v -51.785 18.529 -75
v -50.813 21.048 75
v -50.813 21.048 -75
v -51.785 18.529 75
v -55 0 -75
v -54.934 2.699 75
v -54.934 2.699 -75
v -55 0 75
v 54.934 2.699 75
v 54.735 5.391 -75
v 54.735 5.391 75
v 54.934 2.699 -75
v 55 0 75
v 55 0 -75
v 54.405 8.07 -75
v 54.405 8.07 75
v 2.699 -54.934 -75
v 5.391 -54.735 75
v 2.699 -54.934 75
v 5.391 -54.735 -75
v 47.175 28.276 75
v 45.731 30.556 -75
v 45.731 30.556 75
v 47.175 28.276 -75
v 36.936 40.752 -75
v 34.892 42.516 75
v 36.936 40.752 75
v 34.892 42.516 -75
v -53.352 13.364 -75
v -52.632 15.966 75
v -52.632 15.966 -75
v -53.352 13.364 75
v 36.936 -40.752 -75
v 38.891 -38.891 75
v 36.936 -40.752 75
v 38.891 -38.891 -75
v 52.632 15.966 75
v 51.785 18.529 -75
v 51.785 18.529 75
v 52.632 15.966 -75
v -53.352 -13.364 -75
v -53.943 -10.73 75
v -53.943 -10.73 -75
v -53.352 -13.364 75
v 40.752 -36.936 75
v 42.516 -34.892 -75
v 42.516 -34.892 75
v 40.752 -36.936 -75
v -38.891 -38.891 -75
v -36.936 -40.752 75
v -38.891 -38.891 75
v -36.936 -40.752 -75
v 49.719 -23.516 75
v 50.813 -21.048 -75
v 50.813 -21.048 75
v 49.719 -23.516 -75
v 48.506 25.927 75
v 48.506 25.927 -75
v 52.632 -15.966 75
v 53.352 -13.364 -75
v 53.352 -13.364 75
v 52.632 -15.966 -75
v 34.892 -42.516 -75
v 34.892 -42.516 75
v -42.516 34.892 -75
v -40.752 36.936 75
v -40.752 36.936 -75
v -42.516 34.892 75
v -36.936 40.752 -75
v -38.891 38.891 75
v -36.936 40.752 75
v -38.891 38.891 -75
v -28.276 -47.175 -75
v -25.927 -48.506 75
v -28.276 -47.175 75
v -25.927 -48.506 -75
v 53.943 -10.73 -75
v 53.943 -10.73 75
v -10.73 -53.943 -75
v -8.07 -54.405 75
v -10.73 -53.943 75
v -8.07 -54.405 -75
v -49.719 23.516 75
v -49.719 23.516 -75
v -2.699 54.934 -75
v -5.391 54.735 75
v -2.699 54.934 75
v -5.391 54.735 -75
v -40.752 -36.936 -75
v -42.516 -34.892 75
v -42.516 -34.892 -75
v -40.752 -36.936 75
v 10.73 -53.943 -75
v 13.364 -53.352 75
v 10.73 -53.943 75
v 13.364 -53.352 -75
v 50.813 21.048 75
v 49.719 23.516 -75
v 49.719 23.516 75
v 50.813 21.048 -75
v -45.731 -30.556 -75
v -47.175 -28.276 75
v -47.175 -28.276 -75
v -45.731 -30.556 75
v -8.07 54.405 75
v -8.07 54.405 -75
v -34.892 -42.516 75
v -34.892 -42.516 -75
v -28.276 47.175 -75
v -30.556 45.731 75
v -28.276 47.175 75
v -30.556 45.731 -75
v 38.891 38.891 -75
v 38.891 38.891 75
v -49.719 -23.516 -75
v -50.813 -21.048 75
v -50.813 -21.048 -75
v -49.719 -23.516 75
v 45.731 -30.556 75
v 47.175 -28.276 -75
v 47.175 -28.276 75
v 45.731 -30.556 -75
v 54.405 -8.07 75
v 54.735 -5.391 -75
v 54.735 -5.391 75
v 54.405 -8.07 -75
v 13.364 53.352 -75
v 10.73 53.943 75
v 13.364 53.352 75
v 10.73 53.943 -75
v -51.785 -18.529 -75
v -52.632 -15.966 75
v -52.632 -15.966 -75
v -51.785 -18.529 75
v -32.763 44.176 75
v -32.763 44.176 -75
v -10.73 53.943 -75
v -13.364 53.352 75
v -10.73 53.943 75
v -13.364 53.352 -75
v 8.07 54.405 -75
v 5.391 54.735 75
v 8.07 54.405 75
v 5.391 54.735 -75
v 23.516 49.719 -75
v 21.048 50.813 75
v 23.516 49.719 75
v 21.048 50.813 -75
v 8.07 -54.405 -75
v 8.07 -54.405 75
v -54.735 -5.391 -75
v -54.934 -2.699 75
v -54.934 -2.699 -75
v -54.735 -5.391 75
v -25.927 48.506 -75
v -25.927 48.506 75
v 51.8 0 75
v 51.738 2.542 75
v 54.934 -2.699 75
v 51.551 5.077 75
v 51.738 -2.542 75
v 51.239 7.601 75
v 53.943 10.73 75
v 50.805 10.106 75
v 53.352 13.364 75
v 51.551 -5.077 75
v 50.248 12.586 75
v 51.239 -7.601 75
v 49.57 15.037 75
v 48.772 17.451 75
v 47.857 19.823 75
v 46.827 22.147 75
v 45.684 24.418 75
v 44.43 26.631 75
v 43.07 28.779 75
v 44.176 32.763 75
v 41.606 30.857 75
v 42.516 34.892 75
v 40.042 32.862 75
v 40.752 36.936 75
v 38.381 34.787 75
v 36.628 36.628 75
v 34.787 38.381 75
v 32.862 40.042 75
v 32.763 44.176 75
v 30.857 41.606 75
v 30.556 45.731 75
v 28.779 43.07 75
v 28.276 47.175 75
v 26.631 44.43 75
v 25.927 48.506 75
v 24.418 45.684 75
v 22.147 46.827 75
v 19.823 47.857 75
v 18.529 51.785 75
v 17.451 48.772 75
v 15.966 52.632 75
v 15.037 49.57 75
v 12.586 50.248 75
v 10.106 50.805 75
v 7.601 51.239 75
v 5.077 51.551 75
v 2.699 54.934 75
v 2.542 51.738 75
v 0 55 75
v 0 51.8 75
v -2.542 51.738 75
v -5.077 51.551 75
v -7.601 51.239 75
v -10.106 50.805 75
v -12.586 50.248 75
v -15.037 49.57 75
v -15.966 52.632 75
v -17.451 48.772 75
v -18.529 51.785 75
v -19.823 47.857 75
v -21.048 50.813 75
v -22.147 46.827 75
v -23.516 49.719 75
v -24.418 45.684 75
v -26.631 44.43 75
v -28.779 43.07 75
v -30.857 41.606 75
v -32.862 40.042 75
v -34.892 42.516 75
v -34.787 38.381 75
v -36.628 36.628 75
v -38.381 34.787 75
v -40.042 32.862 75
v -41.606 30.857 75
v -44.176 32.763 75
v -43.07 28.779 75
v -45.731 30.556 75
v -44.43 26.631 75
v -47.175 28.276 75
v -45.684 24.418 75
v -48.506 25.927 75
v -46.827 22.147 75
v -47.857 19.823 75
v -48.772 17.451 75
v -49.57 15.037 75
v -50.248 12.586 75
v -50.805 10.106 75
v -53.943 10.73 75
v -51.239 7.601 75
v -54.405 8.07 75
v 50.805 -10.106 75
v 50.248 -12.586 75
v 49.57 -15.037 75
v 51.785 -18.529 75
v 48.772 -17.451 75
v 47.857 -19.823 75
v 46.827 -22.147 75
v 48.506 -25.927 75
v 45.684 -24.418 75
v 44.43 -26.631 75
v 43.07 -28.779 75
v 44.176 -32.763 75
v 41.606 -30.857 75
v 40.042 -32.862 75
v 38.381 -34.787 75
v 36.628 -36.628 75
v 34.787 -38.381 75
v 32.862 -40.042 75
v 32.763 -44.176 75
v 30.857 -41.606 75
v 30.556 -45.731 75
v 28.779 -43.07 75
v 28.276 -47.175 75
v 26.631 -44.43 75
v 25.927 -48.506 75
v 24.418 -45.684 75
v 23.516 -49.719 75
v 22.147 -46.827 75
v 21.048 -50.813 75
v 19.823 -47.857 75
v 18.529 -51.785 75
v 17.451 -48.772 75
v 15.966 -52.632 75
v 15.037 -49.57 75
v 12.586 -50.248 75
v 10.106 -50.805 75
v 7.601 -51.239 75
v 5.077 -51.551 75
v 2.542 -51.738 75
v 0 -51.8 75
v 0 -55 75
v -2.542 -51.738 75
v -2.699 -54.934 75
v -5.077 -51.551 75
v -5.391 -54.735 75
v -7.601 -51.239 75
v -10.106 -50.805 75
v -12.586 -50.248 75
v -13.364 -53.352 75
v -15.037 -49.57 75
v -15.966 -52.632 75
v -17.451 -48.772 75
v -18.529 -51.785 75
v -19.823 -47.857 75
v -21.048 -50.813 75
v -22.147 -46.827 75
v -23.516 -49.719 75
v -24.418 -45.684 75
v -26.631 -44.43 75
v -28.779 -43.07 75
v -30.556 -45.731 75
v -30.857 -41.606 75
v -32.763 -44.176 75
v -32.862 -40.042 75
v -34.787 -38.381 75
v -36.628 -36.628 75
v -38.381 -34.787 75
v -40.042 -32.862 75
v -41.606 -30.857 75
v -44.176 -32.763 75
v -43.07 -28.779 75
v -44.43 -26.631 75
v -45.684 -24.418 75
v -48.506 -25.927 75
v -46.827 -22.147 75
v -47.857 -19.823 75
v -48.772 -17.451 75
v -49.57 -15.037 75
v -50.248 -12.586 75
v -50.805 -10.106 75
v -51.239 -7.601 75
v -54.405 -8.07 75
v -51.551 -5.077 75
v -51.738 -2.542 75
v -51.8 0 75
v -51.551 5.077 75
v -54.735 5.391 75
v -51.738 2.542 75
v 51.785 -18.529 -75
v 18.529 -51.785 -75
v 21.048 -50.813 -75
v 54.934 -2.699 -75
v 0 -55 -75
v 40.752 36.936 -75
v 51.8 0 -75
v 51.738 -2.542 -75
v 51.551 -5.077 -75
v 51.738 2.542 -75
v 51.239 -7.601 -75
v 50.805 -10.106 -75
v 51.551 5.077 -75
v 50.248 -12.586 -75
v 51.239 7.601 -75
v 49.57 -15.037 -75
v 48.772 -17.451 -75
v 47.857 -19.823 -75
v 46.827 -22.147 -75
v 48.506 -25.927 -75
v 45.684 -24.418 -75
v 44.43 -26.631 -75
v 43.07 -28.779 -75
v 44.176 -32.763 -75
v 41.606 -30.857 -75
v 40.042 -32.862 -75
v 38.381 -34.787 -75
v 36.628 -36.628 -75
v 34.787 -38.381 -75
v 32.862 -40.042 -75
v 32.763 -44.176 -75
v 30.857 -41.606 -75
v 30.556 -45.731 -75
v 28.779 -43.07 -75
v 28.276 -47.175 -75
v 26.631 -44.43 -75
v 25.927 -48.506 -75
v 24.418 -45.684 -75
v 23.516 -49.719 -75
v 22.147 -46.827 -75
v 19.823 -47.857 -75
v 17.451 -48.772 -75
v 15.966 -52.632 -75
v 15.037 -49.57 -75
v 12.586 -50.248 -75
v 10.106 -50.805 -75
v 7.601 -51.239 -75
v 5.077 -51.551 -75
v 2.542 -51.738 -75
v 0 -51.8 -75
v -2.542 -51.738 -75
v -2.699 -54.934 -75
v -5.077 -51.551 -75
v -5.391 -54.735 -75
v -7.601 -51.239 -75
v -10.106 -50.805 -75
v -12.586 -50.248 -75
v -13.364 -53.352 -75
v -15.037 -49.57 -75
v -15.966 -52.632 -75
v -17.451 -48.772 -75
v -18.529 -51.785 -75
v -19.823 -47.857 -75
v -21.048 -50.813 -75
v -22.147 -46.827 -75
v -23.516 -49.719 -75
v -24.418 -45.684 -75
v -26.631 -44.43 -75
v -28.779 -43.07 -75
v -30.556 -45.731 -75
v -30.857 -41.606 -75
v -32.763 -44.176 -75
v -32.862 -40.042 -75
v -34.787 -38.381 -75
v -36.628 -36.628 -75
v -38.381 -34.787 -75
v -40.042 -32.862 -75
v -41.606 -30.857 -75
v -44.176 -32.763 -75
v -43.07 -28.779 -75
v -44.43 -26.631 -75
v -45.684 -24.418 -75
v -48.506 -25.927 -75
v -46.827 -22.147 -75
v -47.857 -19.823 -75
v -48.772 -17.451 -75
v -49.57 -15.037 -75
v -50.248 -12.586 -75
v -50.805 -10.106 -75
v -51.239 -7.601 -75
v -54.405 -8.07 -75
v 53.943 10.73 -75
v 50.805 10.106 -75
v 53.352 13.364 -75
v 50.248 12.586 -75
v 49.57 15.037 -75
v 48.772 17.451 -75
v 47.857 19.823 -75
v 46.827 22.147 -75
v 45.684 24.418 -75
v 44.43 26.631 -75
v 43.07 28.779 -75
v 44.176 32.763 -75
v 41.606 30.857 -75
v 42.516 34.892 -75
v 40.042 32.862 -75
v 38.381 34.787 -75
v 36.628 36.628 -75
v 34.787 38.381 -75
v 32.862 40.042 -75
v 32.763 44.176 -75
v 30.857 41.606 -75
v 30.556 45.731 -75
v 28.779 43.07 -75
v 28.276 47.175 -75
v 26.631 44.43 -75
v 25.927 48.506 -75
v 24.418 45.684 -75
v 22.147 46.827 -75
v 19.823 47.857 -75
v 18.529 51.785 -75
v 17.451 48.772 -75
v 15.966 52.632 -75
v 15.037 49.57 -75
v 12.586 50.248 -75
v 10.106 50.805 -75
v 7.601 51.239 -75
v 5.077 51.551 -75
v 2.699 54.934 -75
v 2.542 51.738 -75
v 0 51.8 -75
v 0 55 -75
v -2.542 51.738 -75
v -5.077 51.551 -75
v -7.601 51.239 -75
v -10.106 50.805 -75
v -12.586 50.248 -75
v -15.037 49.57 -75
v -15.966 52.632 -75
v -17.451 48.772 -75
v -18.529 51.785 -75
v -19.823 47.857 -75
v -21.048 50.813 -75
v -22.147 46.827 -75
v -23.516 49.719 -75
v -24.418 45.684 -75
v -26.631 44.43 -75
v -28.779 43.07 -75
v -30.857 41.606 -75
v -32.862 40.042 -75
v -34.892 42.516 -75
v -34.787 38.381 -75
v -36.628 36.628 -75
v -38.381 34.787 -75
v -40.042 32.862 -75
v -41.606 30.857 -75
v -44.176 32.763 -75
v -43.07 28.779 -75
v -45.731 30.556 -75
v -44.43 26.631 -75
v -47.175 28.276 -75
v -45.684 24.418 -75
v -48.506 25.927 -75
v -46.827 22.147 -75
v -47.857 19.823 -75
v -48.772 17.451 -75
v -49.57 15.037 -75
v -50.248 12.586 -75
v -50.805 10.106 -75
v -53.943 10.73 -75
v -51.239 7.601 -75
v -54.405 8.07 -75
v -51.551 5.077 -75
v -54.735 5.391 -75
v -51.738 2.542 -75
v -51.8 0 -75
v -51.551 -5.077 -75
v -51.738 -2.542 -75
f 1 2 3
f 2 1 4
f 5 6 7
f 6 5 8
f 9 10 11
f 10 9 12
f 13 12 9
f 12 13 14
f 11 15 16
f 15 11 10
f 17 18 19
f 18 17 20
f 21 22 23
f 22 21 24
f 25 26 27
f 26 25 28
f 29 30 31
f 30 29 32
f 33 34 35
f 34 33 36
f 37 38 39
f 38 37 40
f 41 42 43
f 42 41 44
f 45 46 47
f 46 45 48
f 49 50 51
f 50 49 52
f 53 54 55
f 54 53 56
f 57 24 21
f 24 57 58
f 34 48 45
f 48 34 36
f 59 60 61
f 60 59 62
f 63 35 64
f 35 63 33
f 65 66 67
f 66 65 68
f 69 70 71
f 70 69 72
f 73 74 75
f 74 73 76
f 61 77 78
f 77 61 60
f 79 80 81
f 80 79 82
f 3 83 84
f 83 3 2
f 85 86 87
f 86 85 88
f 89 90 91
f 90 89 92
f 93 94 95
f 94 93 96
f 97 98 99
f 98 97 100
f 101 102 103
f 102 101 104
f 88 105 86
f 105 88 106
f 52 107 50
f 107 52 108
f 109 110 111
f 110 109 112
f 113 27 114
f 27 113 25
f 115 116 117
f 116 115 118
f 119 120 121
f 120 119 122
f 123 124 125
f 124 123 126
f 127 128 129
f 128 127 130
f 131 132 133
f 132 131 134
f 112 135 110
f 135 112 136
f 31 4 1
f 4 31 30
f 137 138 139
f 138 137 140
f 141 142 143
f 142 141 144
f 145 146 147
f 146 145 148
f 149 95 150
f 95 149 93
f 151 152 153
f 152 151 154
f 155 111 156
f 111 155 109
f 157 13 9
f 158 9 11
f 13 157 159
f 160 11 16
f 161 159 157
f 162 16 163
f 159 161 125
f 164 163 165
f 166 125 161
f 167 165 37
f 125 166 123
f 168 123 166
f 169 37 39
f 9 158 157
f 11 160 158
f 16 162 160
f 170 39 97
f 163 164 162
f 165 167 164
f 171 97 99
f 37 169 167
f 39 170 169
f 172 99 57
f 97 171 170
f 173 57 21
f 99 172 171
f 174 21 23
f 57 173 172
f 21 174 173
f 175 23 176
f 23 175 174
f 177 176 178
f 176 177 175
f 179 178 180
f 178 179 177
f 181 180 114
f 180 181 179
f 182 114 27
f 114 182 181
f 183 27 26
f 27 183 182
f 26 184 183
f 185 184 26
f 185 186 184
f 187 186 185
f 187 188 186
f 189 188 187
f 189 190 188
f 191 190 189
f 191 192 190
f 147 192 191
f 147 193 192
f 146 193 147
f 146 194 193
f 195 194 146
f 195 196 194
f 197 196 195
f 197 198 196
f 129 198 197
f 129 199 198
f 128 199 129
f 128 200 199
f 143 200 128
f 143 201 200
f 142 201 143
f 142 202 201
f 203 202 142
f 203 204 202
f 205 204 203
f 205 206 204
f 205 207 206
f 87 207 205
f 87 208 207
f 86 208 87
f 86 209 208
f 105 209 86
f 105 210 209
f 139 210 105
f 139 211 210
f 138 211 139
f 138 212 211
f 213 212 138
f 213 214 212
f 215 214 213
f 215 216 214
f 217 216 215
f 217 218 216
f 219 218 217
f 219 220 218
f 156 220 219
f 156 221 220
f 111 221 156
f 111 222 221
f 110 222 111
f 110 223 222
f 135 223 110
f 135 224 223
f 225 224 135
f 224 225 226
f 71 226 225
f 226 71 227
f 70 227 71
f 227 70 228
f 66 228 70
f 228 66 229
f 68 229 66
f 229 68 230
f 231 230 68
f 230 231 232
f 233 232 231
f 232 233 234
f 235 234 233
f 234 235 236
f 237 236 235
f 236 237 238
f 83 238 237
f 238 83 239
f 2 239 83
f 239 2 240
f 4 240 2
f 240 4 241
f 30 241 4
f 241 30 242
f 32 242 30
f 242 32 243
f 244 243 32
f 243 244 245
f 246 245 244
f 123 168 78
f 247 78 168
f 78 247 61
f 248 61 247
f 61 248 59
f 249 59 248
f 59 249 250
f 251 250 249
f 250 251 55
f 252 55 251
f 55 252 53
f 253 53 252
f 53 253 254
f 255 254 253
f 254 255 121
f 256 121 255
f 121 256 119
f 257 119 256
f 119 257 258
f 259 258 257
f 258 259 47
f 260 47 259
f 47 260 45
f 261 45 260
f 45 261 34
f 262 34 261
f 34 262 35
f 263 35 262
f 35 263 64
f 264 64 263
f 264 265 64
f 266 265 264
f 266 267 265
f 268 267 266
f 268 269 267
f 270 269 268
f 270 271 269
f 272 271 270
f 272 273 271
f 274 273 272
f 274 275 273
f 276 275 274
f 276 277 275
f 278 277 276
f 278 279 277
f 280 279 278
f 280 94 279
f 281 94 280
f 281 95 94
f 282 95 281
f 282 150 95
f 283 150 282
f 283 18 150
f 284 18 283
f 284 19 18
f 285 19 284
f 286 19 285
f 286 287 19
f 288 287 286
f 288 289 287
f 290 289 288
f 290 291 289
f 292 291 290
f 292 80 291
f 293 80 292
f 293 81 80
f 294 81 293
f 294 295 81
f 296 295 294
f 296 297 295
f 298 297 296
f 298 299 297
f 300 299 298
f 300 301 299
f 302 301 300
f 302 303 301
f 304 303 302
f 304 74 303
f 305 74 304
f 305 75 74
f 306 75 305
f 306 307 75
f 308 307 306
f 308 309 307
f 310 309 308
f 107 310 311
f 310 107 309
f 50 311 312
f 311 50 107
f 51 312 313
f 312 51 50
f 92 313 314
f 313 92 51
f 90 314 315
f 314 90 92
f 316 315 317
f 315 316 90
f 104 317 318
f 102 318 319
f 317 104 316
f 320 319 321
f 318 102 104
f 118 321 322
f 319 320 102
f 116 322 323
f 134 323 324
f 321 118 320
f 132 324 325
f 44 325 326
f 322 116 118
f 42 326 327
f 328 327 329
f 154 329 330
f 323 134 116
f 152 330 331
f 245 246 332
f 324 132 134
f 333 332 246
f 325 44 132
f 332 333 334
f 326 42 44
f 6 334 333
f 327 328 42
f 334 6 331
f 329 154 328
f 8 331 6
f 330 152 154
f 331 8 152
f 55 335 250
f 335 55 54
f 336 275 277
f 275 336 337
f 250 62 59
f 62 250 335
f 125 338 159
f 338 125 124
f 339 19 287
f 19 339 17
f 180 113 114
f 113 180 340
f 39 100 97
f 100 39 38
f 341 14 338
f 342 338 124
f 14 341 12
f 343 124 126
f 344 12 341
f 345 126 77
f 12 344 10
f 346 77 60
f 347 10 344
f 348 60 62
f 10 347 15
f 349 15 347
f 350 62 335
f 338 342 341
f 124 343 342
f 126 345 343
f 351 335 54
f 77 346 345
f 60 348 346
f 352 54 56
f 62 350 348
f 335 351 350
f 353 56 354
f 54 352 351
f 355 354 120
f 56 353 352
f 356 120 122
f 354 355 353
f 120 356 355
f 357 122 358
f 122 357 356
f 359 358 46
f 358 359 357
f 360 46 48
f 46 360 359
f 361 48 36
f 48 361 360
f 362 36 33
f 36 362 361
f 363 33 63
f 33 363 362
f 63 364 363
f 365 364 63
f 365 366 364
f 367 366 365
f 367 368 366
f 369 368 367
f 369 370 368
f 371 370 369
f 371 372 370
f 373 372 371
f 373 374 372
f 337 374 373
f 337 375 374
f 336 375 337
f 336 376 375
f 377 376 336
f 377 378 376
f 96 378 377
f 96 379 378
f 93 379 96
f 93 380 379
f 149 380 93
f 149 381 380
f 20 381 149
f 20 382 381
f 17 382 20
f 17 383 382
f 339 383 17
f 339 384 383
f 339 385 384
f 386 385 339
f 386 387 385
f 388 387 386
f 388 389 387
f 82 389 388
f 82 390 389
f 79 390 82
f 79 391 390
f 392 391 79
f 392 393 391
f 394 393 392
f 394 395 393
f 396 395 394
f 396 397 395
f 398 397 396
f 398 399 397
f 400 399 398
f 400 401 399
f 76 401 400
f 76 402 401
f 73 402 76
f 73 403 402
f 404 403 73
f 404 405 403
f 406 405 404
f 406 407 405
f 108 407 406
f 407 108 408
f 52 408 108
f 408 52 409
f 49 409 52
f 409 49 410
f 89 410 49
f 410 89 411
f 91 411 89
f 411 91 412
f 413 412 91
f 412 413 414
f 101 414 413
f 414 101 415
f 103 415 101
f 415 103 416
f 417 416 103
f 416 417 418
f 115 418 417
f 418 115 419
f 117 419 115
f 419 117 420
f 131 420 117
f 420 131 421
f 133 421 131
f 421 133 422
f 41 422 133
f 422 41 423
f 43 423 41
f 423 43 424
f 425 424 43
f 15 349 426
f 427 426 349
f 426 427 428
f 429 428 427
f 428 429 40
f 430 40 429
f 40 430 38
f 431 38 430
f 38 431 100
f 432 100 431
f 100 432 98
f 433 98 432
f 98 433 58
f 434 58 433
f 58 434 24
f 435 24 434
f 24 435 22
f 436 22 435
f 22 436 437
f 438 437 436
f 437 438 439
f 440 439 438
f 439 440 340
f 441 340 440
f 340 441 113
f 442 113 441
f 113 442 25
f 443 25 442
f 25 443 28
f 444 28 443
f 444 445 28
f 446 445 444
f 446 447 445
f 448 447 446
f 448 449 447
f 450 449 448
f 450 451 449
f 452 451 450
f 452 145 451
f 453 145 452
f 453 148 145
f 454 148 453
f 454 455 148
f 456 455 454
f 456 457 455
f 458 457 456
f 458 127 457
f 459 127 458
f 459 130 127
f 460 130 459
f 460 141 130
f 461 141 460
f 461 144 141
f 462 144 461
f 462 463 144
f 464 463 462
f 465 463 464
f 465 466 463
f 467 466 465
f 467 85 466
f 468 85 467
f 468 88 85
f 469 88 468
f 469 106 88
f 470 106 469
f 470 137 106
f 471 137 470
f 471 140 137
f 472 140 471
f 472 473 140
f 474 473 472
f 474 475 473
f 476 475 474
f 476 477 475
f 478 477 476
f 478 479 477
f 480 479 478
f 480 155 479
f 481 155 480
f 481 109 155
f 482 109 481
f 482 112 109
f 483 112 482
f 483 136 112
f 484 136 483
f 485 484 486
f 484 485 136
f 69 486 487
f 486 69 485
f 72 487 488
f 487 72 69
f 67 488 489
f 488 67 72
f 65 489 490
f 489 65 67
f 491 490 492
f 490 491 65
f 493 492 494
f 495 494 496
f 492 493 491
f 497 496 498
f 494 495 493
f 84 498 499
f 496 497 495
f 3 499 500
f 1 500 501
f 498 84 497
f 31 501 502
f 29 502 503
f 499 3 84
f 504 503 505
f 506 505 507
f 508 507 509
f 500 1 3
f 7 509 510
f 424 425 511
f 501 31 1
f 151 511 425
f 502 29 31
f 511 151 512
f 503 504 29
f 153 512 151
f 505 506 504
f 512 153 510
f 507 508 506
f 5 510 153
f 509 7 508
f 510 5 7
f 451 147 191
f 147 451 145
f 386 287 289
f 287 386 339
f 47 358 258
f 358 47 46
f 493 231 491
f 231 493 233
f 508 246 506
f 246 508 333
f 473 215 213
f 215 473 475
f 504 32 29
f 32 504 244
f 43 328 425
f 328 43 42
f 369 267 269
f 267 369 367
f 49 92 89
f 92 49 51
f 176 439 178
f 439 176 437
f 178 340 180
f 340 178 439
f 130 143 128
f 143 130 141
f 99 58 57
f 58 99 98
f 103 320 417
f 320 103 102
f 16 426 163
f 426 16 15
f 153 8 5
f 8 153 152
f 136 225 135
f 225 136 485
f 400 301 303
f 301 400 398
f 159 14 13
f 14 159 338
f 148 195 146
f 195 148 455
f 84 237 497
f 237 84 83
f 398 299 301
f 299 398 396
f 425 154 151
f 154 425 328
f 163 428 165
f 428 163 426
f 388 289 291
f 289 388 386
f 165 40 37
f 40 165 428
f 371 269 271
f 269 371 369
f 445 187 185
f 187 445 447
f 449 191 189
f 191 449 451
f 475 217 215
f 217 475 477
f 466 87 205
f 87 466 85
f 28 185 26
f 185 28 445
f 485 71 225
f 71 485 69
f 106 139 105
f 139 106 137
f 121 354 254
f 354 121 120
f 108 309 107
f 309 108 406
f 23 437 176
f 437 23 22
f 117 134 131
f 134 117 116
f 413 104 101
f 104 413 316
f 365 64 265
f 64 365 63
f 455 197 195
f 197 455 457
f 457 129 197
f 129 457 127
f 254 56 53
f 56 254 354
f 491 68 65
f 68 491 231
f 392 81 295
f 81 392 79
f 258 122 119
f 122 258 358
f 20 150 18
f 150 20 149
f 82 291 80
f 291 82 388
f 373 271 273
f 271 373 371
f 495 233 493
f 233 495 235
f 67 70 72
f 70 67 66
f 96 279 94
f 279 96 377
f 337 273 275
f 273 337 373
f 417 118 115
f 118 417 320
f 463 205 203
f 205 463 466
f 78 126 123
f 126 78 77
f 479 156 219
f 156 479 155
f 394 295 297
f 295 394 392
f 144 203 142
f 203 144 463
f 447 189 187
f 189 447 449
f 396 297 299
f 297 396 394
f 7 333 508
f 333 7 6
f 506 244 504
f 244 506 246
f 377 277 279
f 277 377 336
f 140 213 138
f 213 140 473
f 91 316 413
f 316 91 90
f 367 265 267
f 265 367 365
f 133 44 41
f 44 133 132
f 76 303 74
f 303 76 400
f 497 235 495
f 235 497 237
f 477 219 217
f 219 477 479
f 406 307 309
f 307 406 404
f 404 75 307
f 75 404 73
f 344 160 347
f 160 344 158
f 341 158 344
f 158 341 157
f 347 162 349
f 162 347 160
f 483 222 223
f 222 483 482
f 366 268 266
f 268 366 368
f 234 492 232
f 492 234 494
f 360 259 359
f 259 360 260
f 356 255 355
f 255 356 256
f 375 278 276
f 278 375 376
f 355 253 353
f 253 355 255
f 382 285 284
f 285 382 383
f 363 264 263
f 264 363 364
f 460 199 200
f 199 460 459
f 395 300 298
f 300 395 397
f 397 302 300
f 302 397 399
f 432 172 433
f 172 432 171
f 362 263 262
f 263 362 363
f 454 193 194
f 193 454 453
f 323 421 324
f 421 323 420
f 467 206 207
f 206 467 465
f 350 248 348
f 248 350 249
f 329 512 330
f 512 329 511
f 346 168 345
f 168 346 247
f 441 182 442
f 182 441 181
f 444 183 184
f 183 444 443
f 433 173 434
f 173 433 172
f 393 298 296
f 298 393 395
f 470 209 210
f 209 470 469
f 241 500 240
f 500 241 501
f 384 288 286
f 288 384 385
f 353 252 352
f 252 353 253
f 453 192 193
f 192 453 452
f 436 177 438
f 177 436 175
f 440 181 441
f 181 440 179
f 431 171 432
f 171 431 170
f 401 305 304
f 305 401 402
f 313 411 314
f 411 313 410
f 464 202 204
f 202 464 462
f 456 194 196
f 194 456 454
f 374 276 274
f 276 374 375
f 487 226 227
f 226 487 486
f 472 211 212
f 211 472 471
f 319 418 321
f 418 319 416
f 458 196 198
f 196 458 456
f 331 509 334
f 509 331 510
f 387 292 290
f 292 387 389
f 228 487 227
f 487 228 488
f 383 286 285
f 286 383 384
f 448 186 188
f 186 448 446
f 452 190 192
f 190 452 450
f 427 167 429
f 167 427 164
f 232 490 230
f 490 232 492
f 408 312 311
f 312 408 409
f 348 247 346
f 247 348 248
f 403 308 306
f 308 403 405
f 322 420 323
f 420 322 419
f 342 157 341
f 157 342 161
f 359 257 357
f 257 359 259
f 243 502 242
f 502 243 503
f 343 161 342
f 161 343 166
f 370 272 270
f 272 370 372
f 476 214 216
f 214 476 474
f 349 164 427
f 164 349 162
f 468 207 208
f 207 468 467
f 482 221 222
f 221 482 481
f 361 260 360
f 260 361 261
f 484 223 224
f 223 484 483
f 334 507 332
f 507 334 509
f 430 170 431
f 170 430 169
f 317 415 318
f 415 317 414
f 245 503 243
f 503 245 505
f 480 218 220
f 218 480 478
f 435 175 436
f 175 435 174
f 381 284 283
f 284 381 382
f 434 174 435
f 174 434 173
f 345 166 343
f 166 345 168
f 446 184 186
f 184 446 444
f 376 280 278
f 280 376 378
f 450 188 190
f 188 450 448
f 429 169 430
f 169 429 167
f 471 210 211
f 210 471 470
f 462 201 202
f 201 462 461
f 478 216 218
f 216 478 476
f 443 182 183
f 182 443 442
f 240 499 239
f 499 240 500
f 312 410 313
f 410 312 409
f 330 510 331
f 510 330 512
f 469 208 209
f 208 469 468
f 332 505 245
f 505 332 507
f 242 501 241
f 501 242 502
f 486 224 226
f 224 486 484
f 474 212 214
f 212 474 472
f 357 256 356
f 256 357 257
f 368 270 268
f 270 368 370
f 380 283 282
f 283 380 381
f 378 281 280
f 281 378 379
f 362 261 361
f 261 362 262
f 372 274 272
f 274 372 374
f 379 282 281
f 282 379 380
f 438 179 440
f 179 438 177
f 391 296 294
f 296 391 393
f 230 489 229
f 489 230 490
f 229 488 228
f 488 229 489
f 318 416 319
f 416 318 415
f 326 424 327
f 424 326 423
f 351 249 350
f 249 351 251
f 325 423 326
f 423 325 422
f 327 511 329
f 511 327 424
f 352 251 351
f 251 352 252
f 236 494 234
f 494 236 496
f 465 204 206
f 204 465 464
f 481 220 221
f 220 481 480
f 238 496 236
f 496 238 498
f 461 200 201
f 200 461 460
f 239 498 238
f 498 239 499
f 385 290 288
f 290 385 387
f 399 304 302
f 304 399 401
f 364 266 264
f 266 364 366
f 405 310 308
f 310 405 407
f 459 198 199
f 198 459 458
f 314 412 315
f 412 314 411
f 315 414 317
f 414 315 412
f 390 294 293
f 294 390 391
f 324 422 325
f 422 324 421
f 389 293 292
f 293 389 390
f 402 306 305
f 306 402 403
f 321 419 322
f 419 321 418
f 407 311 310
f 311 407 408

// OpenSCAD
$fn=128;

module ht_pipe(od=110, length=150, wall=3.2) {
    id = od - 2*wall;
    difference() {
        cylinder(h=length, d=od, center=true);
        cylinder(h=length+2, d=id, center=true);
    }
}

ht_pipe(od=110, length=150, wall=3.2);
